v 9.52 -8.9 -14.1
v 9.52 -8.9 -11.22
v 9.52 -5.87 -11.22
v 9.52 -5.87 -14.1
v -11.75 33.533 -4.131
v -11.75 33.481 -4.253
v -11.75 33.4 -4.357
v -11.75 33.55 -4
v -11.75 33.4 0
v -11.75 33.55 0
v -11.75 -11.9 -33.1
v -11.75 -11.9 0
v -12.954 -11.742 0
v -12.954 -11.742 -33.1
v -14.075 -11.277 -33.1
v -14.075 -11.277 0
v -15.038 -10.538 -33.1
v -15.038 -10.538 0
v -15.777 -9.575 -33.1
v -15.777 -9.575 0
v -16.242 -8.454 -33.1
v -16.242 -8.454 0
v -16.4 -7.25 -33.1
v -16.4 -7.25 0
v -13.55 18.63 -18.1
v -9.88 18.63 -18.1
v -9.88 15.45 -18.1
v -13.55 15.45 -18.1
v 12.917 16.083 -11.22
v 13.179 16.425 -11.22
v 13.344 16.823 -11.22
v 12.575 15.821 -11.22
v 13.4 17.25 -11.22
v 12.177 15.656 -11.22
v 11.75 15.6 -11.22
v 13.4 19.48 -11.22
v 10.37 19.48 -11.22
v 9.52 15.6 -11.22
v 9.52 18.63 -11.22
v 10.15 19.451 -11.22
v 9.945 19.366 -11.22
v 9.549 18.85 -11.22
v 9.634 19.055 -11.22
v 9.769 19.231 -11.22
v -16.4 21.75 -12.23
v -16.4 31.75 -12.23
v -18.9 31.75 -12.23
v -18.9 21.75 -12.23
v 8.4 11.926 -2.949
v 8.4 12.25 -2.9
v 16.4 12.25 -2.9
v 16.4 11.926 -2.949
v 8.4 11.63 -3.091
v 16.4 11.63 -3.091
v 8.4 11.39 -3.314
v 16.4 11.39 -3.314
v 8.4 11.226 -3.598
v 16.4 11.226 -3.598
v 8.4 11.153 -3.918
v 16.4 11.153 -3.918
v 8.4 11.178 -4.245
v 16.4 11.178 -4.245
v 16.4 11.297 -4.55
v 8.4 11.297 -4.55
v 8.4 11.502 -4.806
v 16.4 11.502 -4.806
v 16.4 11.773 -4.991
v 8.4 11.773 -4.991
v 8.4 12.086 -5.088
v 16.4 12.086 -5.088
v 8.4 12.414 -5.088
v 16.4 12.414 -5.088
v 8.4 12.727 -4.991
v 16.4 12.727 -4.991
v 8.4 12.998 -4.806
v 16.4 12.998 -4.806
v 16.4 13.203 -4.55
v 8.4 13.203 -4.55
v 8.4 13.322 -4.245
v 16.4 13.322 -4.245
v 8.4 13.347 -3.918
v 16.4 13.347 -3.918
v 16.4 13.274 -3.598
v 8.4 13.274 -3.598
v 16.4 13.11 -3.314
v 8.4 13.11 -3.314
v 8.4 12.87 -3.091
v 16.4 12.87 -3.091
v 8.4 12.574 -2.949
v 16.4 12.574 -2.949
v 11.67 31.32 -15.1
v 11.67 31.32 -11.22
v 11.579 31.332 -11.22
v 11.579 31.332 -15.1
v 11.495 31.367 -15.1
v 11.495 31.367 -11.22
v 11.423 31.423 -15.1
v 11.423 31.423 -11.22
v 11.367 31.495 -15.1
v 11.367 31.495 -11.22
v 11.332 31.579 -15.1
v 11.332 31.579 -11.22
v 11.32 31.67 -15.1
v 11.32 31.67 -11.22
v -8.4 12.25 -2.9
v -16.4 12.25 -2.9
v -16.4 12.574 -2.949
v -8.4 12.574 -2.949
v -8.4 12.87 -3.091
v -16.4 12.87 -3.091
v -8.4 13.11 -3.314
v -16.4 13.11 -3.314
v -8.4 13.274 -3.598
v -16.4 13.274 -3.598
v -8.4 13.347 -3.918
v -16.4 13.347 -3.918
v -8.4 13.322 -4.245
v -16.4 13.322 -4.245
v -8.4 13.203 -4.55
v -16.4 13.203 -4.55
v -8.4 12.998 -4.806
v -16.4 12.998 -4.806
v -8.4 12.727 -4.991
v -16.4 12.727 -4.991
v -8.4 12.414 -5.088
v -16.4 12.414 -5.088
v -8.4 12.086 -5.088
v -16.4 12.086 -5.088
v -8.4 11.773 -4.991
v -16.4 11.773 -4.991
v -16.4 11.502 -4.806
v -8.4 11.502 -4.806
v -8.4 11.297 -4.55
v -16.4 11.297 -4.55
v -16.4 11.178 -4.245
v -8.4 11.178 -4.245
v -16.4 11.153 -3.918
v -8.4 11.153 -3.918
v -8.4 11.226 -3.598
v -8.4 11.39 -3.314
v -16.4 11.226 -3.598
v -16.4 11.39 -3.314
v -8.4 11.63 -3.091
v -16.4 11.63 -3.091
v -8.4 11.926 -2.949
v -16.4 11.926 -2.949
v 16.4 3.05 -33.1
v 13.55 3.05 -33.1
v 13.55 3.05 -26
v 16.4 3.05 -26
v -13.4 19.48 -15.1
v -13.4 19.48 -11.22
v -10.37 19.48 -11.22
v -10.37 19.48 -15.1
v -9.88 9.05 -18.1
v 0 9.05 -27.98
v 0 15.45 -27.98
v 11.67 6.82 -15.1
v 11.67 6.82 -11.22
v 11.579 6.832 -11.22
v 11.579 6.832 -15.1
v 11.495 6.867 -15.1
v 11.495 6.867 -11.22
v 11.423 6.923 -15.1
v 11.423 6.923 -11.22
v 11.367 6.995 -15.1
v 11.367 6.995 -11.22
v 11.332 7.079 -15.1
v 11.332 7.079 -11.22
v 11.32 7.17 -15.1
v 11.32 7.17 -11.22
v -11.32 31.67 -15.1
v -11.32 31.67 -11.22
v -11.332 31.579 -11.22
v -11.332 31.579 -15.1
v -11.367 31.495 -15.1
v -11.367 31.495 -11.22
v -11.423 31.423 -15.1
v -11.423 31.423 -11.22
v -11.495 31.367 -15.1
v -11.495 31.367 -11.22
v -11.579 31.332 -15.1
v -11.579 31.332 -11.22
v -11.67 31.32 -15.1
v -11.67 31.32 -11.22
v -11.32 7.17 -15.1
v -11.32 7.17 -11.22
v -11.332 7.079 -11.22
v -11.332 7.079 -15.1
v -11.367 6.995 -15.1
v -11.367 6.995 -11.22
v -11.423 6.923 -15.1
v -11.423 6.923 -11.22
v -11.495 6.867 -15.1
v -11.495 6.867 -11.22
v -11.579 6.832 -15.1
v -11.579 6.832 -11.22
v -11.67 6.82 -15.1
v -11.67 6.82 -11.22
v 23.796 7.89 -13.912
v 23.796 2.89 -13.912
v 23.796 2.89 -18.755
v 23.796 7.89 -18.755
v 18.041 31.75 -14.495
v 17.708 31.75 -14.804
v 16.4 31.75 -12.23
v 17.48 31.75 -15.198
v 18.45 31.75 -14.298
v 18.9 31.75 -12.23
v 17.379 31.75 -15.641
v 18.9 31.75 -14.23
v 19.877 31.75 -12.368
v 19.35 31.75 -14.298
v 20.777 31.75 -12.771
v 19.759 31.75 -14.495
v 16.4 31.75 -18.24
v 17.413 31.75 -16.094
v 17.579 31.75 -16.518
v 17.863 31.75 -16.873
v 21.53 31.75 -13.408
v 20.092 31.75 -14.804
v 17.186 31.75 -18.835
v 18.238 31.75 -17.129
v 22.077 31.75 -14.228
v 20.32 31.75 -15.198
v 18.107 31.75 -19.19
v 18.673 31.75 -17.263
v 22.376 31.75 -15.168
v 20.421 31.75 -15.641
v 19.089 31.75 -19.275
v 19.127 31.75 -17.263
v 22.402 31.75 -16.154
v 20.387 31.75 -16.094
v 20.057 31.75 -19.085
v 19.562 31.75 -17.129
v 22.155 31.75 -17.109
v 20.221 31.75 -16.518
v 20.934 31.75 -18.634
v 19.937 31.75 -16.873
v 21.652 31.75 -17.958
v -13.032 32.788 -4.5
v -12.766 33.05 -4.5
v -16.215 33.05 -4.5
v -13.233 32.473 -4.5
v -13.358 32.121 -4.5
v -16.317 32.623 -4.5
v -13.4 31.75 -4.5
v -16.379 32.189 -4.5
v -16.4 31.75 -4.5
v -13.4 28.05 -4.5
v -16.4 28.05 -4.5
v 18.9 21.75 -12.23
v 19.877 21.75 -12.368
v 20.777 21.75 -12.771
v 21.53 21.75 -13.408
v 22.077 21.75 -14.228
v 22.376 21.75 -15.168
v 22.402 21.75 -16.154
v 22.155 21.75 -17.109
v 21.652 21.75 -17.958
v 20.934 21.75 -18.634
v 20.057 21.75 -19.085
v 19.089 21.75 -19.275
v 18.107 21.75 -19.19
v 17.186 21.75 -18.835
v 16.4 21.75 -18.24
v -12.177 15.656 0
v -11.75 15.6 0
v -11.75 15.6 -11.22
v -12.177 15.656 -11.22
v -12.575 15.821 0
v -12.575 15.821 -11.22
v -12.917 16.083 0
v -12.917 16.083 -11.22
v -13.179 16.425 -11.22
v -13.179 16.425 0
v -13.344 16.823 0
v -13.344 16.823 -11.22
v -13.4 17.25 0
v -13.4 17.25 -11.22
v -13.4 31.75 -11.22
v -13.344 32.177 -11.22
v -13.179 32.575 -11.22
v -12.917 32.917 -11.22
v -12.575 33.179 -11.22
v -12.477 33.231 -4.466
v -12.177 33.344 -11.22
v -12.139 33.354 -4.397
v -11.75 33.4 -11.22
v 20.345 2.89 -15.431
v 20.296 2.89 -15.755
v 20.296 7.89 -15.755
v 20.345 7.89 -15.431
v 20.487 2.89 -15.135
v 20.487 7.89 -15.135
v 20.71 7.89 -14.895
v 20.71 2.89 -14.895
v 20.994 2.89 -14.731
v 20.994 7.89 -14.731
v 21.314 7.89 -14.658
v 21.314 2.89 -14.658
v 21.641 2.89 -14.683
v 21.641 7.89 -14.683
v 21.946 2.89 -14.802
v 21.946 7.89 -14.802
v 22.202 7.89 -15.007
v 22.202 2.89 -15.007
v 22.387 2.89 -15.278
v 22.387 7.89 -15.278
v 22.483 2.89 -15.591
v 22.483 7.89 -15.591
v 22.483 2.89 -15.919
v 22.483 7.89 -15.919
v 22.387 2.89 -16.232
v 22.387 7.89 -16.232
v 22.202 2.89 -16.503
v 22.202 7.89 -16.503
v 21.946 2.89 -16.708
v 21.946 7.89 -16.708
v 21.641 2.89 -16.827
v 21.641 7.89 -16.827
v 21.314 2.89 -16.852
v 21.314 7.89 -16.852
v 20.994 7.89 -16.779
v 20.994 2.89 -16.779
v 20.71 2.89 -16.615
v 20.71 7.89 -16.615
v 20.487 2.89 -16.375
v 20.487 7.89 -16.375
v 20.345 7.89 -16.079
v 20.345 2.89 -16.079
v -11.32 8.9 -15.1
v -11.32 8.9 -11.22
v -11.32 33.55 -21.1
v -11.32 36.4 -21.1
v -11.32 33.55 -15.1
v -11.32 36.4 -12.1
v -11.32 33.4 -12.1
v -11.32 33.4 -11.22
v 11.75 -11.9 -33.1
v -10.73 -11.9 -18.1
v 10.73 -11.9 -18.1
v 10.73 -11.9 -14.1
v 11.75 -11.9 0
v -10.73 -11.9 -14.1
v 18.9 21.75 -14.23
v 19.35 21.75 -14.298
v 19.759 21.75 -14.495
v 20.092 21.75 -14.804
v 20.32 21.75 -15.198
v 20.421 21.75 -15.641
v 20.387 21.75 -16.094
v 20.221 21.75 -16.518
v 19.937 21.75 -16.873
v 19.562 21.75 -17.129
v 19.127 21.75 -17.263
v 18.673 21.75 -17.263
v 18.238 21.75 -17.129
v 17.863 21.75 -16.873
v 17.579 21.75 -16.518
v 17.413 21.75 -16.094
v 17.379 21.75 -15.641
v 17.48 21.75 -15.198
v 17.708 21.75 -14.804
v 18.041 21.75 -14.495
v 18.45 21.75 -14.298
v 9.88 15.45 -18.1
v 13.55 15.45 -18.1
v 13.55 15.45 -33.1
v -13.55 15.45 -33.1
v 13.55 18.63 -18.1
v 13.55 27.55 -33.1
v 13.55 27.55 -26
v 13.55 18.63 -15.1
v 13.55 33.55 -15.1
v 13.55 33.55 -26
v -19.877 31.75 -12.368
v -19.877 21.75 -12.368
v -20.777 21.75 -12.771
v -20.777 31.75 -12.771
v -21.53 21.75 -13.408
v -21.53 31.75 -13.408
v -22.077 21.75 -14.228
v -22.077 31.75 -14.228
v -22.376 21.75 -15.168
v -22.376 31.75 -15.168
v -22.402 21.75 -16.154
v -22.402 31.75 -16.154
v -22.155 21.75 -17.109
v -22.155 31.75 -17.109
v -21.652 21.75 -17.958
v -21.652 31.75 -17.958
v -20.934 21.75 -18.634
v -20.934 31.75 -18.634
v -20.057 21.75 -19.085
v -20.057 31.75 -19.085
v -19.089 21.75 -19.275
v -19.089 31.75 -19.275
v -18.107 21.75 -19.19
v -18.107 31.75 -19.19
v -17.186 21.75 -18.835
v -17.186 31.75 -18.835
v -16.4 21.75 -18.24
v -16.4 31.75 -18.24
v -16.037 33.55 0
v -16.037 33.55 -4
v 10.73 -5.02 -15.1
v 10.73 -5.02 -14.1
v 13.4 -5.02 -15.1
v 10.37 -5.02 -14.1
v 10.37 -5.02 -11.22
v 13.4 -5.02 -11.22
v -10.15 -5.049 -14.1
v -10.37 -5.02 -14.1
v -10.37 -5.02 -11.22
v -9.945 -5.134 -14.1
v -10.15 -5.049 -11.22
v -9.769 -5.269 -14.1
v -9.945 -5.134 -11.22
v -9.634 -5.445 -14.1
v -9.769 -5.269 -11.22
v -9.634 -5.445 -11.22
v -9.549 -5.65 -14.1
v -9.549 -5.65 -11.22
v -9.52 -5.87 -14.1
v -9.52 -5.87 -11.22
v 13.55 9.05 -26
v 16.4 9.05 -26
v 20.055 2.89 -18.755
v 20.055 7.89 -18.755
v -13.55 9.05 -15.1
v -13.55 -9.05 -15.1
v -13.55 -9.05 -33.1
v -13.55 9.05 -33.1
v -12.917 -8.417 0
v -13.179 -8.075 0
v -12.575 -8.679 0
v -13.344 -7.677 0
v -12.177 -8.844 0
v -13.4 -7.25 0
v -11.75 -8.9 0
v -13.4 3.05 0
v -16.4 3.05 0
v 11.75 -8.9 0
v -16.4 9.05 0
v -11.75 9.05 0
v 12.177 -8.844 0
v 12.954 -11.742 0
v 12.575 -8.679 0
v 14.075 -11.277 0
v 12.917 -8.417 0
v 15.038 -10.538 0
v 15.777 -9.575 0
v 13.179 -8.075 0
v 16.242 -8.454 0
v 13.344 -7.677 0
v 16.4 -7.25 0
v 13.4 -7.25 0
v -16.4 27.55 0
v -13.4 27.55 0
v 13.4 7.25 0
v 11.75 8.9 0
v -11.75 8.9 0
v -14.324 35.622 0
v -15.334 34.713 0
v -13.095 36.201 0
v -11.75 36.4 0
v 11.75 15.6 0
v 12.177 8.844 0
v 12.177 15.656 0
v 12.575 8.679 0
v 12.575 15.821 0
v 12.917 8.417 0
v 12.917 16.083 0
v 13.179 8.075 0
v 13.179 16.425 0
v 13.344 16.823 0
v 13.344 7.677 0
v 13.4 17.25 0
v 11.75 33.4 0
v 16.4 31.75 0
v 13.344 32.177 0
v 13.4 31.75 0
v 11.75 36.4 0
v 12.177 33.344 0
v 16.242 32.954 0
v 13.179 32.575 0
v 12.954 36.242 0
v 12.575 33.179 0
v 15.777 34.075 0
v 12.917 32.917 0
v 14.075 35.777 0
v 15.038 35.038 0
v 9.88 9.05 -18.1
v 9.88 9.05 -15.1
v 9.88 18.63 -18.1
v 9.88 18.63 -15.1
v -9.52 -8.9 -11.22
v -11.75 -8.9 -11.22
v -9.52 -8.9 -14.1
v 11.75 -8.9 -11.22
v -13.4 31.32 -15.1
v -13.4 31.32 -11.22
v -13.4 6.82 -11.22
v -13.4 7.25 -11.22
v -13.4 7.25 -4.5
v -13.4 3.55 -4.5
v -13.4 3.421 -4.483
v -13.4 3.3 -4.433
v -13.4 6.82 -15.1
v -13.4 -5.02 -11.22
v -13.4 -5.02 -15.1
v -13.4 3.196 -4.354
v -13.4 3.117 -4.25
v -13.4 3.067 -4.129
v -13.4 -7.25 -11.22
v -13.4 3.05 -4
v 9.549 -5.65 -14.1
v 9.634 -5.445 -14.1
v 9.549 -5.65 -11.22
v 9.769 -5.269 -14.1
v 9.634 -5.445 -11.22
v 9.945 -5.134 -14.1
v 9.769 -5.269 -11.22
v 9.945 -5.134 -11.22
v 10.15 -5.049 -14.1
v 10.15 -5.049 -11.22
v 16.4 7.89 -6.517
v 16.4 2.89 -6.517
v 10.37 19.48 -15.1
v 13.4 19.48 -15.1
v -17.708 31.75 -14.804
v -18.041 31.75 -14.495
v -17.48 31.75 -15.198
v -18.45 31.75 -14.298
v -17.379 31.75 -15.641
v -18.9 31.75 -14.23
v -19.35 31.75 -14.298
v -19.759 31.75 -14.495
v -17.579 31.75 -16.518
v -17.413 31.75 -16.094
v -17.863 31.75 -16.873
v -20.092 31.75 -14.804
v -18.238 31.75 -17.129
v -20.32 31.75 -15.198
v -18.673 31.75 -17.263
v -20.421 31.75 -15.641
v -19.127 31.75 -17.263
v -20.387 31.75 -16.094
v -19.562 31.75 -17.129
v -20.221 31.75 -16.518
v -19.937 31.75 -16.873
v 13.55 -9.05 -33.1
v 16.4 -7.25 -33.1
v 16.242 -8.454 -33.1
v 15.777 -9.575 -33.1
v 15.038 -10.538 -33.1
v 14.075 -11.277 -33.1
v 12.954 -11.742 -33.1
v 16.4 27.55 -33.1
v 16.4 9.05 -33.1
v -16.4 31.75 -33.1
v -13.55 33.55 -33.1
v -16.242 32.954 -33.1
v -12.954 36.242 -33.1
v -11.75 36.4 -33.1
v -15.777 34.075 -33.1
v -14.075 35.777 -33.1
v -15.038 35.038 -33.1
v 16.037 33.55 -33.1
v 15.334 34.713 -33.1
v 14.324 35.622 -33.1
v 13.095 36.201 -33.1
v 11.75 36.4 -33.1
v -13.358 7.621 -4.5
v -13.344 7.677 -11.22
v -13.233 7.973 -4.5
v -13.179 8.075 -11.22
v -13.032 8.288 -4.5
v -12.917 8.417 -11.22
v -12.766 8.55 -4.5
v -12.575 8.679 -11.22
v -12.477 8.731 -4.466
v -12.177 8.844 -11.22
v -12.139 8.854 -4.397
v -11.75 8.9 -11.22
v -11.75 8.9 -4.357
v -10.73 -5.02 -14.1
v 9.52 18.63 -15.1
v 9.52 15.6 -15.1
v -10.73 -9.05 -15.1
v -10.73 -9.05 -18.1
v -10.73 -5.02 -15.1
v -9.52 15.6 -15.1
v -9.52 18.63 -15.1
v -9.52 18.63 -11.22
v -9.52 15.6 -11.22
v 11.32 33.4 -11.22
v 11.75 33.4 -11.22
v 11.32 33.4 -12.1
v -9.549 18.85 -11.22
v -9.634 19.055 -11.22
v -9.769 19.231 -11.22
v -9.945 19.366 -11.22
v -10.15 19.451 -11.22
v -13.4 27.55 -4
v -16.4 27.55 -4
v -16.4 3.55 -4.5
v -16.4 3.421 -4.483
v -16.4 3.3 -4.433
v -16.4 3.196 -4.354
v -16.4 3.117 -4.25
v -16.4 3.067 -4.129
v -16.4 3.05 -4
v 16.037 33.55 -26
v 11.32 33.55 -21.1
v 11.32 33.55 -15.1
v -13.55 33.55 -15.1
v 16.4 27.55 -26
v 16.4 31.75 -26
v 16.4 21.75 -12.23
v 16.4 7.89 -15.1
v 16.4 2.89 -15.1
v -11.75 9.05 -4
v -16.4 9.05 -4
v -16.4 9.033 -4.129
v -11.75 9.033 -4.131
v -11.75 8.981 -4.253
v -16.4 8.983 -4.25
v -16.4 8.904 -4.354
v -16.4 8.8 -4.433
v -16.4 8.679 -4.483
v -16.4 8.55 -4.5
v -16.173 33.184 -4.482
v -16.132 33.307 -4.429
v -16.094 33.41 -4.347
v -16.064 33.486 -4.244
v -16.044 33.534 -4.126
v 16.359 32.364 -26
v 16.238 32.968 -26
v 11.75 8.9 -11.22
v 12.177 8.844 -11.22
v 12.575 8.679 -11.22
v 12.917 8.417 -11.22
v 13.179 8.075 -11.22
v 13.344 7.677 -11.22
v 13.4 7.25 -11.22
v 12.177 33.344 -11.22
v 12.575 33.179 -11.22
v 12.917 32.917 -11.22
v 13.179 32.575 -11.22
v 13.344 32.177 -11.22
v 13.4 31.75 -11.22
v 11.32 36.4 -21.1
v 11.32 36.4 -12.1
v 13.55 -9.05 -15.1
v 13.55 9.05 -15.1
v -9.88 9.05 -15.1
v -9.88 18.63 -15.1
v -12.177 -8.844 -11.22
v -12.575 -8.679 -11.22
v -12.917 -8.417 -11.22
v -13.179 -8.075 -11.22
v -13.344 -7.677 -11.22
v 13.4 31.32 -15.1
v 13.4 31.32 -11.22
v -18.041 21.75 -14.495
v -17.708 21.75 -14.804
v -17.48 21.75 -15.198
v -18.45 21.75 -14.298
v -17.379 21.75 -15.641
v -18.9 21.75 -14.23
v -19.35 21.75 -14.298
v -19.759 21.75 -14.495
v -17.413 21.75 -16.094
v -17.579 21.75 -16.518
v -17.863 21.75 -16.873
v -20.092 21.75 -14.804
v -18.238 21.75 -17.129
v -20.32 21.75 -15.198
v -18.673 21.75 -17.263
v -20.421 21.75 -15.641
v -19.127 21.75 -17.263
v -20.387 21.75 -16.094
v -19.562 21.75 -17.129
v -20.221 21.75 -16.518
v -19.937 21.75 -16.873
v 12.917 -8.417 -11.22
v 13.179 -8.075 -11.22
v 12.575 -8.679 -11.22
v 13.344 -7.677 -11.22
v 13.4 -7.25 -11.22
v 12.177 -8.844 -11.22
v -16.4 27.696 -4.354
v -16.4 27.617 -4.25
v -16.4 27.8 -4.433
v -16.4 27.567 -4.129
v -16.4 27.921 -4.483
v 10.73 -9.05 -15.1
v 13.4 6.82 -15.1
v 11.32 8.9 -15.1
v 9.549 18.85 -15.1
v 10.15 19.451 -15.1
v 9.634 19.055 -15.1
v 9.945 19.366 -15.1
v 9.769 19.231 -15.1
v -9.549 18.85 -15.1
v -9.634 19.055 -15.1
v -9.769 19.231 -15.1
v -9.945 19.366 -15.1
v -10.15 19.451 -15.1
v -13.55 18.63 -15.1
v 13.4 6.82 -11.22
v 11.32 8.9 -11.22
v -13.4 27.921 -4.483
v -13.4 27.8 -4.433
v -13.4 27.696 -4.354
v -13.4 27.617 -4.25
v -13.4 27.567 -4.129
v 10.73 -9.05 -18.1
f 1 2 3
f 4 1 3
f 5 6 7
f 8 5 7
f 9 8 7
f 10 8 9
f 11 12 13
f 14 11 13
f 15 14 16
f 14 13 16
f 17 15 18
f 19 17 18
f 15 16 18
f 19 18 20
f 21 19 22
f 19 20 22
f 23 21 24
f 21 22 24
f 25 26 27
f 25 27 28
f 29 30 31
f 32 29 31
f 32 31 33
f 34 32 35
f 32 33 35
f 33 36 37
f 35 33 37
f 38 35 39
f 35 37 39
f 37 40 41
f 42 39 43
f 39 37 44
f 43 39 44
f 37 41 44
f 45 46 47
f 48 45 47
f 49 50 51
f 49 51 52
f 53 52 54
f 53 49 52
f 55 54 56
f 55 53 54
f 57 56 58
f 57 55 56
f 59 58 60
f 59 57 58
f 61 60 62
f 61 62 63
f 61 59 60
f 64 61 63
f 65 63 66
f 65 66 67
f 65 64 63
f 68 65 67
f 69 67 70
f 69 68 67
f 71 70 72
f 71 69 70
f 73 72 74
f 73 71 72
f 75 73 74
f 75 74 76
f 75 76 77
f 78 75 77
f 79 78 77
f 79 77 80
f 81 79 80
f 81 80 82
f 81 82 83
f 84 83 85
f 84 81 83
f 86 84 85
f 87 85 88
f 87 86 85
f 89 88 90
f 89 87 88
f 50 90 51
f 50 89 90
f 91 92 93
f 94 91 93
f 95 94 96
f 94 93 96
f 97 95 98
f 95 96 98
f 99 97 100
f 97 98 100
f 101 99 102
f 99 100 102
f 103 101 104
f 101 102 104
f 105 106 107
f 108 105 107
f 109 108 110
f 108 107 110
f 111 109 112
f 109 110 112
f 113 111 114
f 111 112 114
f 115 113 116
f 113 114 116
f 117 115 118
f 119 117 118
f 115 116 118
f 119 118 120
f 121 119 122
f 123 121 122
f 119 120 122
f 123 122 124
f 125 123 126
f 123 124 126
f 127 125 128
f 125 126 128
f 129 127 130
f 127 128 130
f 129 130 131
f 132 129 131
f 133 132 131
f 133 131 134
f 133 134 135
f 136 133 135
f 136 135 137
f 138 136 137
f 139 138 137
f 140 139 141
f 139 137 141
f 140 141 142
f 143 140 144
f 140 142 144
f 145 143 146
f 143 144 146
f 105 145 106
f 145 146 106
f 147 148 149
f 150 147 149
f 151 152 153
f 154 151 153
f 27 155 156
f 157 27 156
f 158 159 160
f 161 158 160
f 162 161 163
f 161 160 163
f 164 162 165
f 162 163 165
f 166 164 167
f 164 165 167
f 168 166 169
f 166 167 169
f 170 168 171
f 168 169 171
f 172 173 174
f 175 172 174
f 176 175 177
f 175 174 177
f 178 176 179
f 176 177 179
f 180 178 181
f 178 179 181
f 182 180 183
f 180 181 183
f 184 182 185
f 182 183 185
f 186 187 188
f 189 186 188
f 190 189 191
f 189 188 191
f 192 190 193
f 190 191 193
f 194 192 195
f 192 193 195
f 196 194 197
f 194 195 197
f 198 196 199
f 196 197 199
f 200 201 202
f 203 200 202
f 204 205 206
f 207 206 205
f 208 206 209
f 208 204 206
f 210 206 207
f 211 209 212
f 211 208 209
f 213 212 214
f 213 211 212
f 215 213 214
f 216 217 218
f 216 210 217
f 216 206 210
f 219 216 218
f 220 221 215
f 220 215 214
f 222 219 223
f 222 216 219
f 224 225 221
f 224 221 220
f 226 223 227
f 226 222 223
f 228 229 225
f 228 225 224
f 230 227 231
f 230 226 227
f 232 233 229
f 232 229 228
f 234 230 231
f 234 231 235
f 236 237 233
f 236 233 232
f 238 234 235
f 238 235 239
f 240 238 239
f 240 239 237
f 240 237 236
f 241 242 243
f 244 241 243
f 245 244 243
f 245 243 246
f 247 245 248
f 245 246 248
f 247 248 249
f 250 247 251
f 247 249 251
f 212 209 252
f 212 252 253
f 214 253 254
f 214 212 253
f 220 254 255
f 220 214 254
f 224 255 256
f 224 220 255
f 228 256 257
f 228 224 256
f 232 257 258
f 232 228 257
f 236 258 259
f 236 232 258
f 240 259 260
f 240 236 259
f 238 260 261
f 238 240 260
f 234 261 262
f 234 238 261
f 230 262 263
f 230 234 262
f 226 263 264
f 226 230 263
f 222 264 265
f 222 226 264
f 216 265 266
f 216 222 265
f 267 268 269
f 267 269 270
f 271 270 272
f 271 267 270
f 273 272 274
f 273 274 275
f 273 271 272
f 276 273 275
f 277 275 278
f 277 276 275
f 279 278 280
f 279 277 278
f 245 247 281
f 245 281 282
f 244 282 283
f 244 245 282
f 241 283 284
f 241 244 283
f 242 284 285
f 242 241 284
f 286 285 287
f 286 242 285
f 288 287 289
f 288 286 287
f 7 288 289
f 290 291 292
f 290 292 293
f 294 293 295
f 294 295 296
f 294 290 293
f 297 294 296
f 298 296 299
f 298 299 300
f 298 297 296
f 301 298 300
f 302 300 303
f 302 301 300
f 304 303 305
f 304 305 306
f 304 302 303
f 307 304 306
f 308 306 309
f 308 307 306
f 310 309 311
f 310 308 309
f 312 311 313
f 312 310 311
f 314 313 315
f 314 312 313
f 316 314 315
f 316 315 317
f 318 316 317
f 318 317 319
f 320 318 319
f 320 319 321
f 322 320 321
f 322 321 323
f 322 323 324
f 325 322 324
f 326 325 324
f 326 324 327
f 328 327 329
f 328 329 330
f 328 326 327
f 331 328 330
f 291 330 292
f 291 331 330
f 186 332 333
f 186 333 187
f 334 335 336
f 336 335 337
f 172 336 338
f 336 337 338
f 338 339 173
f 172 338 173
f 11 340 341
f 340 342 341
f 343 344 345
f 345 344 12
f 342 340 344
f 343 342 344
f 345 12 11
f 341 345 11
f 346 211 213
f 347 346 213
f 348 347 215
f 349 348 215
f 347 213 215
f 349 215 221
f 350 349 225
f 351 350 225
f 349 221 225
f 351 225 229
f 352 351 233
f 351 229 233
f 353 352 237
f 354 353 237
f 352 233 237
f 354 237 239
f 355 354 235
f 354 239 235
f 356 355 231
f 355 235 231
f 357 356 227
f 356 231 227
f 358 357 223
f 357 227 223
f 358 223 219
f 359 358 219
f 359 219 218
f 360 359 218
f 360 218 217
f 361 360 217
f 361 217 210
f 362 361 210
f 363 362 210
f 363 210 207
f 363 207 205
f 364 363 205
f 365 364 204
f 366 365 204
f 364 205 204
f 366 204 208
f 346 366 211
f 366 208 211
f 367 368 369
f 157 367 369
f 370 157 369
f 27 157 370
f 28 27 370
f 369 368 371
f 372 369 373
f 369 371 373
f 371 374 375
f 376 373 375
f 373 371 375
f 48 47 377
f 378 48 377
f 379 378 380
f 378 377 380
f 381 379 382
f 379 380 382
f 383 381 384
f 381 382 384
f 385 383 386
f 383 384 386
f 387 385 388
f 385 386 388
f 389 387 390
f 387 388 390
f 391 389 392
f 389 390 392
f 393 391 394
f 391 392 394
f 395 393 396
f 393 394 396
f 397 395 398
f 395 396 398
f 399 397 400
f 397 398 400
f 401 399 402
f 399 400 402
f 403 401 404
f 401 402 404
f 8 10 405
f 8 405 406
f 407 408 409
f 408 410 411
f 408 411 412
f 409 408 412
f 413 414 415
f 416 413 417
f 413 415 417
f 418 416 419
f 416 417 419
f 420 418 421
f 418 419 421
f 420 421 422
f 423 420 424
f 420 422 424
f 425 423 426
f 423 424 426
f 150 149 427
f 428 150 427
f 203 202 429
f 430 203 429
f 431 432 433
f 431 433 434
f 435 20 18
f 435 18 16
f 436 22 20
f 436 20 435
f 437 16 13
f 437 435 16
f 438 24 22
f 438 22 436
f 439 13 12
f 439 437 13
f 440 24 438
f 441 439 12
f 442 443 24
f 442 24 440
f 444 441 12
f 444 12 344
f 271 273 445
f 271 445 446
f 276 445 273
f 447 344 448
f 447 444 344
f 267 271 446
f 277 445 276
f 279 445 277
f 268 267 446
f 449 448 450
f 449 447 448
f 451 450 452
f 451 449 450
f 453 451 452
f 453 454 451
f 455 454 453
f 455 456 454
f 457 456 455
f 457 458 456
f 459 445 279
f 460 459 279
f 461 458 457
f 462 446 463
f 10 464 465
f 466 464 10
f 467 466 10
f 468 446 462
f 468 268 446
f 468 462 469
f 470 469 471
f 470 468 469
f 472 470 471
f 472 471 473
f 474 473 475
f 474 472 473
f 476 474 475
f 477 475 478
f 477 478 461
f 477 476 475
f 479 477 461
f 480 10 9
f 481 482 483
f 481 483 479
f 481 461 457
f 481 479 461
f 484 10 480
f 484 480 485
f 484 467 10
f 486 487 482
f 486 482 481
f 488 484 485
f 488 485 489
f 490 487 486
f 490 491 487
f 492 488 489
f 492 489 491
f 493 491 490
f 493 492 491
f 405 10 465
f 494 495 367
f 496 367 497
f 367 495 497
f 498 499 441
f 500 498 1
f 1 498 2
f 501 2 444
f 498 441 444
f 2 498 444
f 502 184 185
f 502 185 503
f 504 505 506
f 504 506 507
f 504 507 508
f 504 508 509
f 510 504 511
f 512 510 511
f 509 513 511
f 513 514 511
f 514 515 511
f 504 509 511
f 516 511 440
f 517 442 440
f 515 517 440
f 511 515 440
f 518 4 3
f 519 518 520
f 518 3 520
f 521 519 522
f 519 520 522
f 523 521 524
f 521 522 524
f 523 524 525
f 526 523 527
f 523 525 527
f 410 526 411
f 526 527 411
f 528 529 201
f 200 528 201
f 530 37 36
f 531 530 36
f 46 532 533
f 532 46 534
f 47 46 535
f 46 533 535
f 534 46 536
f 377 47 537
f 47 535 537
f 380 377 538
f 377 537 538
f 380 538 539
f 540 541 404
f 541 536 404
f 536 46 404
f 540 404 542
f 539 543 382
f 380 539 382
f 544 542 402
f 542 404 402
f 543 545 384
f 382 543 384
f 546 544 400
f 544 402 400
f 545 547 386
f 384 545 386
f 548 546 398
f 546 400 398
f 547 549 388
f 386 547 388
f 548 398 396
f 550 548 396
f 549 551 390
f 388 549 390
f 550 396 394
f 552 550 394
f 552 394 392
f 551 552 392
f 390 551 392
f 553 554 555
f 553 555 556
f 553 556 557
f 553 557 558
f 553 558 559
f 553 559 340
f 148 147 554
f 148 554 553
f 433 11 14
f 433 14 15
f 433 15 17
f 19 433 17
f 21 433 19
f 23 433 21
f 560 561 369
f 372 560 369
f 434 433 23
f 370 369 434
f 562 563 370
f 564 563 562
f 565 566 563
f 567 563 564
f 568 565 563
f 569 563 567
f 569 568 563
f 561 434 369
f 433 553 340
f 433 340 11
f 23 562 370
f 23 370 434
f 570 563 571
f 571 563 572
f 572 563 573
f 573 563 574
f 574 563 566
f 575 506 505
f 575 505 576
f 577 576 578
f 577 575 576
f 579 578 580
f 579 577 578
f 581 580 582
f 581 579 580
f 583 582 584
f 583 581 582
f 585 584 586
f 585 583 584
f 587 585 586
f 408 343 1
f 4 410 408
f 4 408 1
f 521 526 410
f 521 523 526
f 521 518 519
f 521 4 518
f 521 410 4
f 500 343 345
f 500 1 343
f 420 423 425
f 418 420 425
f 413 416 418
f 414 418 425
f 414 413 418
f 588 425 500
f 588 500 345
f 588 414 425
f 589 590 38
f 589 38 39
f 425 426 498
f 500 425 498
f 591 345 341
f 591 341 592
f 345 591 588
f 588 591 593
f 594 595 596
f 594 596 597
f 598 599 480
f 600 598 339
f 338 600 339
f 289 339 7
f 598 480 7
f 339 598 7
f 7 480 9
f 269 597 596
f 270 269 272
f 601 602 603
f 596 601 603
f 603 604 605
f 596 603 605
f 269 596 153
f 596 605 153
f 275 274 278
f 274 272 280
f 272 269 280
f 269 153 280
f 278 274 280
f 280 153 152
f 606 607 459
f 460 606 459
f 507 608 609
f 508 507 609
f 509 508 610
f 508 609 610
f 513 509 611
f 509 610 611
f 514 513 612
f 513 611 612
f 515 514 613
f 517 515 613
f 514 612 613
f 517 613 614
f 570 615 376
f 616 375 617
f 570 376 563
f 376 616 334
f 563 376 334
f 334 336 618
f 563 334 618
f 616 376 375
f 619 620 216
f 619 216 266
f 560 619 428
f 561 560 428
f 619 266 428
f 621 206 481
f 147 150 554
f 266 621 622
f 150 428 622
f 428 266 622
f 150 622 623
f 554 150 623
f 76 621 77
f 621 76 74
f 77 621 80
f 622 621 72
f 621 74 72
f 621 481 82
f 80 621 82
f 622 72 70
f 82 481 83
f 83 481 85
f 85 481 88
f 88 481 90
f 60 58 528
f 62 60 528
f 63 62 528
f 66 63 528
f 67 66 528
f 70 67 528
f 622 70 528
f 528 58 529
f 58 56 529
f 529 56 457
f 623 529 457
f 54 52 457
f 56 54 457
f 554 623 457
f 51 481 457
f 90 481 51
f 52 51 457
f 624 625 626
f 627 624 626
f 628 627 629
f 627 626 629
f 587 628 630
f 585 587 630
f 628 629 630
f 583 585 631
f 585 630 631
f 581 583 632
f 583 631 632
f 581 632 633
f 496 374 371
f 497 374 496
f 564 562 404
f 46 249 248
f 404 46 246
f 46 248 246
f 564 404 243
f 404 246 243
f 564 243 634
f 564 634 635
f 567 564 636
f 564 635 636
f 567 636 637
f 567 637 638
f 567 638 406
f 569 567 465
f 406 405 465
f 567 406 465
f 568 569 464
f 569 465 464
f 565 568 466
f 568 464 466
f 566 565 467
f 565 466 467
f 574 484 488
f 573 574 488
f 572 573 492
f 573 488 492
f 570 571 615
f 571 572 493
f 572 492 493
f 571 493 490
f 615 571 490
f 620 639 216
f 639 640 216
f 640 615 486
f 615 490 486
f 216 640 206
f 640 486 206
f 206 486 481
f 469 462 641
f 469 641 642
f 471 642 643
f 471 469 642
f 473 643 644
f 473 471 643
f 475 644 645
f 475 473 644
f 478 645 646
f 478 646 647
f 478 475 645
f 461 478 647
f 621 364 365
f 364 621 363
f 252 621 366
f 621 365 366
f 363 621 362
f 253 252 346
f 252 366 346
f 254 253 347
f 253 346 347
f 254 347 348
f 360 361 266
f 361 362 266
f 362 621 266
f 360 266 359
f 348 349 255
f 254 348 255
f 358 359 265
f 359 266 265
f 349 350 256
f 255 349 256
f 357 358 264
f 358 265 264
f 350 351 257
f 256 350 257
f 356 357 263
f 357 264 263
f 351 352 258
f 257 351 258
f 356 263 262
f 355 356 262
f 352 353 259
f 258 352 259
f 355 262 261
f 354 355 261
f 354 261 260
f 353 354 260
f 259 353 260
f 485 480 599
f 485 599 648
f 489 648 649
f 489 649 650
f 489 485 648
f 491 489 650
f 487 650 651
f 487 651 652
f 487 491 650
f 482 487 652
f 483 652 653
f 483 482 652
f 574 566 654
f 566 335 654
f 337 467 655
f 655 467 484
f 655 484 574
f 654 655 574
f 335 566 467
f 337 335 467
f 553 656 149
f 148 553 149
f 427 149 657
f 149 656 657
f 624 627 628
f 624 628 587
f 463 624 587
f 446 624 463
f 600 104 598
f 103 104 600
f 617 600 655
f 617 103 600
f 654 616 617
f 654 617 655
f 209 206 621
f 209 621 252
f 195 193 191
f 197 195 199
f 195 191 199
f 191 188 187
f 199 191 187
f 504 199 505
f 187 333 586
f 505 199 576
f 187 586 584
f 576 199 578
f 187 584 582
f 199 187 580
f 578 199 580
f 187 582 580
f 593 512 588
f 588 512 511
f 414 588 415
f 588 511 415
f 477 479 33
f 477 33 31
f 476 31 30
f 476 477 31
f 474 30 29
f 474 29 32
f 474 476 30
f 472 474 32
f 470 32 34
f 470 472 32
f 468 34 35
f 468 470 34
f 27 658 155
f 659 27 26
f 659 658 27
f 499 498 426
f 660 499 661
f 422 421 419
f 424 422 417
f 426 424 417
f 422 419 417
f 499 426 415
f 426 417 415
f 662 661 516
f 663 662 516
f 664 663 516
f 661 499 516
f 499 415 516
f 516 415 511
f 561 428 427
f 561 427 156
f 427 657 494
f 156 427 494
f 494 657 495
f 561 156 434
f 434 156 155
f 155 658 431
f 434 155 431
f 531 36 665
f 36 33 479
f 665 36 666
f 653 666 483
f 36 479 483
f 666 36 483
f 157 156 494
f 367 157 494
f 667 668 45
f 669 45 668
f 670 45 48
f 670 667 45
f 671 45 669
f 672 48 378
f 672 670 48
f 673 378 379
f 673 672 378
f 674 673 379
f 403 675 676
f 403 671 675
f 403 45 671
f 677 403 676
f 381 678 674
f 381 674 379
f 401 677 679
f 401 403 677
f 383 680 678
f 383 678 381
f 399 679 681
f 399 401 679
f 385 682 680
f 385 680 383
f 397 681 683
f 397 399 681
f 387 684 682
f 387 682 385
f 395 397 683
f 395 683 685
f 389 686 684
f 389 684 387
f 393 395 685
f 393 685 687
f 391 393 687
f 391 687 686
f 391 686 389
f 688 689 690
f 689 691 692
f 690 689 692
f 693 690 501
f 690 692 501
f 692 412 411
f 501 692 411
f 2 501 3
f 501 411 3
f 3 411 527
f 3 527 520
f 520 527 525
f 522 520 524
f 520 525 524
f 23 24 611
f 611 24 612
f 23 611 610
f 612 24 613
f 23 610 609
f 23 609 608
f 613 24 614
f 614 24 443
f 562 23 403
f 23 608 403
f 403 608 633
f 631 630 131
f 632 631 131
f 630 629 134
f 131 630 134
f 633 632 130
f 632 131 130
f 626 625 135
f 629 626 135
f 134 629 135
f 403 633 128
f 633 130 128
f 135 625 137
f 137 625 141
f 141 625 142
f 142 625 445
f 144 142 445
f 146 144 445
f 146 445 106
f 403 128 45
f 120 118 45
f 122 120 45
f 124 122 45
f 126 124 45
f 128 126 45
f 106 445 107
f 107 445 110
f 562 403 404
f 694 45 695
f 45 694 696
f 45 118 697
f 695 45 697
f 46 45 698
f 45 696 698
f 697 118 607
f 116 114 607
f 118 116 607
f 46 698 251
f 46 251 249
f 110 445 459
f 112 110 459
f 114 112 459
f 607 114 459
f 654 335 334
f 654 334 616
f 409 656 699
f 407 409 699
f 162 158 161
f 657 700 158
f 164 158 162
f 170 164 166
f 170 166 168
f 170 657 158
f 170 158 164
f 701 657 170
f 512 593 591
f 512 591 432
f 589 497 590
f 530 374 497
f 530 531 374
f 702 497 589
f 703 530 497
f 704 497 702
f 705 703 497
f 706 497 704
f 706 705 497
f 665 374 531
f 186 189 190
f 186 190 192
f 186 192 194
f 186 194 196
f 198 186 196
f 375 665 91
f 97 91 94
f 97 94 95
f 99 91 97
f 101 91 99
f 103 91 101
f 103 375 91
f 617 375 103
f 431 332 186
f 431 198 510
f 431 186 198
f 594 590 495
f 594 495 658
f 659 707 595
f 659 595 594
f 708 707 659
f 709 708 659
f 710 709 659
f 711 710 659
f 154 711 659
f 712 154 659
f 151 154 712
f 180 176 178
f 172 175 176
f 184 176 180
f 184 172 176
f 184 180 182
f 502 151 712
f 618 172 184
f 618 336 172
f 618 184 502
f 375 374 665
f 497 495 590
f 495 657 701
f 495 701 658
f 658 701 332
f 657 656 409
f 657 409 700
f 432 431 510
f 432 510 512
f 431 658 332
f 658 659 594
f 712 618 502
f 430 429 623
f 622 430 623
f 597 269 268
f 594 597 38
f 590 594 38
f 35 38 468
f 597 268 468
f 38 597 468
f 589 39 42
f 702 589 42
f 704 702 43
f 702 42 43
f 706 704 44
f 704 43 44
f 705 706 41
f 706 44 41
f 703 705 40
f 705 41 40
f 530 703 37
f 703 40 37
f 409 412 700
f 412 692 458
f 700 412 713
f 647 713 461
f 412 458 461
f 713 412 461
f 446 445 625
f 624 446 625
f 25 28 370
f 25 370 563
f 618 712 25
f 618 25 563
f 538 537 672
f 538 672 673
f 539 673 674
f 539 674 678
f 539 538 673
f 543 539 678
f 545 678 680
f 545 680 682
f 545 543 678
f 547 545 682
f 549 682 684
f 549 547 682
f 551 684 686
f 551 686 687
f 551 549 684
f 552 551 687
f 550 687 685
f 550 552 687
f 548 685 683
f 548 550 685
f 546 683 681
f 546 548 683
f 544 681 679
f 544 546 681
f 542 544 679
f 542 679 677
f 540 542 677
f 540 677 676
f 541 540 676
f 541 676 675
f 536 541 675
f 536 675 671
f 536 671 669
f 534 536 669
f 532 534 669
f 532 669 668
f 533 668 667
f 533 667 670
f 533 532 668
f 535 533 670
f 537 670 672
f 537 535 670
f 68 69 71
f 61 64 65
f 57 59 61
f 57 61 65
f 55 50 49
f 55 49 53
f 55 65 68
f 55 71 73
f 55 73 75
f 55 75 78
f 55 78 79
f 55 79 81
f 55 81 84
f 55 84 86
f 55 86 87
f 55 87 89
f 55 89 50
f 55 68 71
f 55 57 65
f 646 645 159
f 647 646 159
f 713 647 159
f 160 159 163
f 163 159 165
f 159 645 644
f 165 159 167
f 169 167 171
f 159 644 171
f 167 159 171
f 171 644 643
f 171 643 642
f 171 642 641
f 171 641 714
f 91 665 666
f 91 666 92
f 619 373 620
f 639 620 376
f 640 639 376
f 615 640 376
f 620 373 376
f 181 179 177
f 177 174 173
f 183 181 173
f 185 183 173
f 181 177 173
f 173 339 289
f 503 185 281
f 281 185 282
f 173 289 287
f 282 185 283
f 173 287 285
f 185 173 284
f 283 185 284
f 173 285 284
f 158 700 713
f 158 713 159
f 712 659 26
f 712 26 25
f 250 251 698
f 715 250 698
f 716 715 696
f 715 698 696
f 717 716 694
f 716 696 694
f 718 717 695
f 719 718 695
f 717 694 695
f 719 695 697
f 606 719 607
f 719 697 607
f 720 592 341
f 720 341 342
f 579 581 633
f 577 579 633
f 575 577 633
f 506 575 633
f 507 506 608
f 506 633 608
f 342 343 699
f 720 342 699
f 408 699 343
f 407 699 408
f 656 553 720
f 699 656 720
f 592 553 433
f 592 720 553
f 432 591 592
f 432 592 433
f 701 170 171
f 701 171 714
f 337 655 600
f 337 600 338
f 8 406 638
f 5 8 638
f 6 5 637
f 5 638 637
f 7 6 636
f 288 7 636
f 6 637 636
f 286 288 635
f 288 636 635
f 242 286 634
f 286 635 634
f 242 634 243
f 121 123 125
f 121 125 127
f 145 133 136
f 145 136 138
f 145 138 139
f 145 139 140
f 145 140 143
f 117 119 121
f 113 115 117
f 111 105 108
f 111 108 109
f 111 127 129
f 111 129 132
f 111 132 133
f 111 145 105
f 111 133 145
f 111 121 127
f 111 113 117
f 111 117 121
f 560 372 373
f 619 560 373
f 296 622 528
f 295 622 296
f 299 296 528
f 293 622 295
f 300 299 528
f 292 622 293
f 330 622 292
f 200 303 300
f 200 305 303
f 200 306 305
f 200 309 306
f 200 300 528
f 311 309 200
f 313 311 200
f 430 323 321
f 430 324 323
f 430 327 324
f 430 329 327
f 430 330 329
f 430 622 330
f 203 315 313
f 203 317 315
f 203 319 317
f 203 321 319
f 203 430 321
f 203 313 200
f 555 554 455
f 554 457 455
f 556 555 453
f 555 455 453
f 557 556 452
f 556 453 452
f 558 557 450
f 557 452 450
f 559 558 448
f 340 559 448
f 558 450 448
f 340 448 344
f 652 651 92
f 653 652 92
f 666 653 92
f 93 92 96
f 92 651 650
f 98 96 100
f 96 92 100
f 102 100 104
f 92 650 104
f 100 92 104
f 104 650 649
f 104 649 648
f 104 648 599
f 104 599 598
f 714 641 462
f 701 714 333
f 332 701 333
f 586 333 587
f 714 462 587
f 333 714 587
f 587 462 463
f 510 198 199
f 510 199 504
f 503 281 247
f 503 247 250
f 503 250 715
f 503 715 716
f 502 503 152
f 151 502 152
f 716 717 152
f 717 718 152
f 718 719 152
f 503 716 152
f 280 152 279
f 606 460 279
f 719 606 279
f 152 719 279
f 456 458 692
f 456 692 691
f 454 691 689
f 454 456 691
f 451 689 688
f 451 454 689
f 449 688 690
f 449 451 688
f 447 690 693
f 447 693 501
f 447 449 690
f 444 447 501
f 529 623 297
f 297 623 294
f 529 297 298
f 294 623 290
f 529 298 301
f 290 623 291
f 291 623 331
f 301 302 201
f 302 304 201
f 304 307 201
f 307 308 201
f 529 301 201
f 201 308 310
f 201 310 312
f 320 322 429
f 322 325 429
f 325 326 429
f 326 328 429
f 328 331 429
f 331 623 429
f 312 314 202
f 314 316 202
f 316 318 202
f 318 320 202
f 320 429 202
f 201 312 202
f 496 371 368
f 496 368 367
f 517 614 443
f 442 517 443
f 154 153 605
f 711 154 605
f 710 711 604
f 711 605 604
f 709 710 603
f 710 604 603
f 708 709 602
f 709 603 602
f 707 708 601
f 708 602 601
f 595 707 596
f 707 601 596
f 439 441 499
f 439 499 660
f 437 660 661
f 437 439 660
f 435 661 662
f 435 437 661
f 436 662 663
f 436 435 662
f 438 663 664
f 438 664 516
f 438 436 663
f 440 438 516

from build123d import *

# Parameters (mm, degrees)
EXTRUDE_2_DEPTH      = 11.22
EXTRUDE_3_DEPTH      = 3.88
CUT_EXTRUDE_1_DEPTH  = 4.65
SKETCH_8_R           = 3.525
SKETCH_8_R_2         = 1.525
EXTRUDE_5_DEPTH      = 10
SKETCH_9_W           = 22.64
SKETCH_9_H           = 3
CUT_EXTRUDE_3_DEPTH  = 3
SKETCH_10_W          = 21.46
SKETCH_10_H          = 6.88
CUT_EXTRUDE_4_DEPTH  = 1
SKETCH_11_R          = 1.1
EXTRUDE_6_DEPTH      = 5
SKETCH_12_R          = 1.1
CUT_EXTRUDE_5_DEPTH  = 8
CUT_EXTRUDE_START    = -8
SKETCH_13_R          = 1.1
CUT_EXTRUDE_6_DEPTH  = 8
SKETCH_14_W          = 6.52
SKETCH_14_H          = 9.58
EXTRUDE_7_DEPTH      = 3
SKETCH_15_W          = 27.1
SKETCH_15_H          = 42.6
EXTRUDE_8_DEPTH      = 18
SKETCH_16_W          = 27.1
SKETCH_16_H          = 6.4
EXTRUDE_9_DEPTH      = 15
CUT_EXTRUDE_8_REACH  = 51.09
CUT_EXTRUDE_9_REACH  = 62.949
SKETCH_18_W          = 7.1
SKETCH_18_H          = 6
CUT_EXTRUDE_START_2  = -2.85
SKETCH_19_W          = 21.46
SKETCH_19_H          = 1
SKETCH_19_H_2        = 3
CUT_EXTRUDE_10_DEPTH = 2.85
CUT_EXTRUDE_11_REACH = 65.204
SKETCH_20_W          = 22.64
SKETCH_20_H          = 6


with BuildPart() as part:
    # 草图2 → 凸台-拉伸2 (new body)
    with BuildSketch(Plane.XY):
        with BuildLine():
            ThreePointArc((-16.4, -7.25), (-15.038046533, -10.538046533), (-11.75, -11.9))
            Line((-11.75, -11.9), (11.75, -11.9))
            ThreePointArc((11.75, -11.9), (15.038046533, -10.538046533), (16.4, -7.25))
            Line((16.4, -7.25), (16.4, 31.75))
            ThreePointArc((16.4, 31.75), (15.038046533, 35.038046533), (11.75, 36.4))
            Line((11.75, 36.4), (-11.75, 36.4))
            ThreePointArc((-11.75, 36.4), (-15.038046533, 35.038046533), (-16.4, 31.75))
            Line((-16.4, 31.75), (-16.4, -7.25))
        make_face()
        with BuildLine():
            Line((13.4, 7.25), (13.4, -7.25))
            ThreePointArc((13.4, -7.25), (12.916726189, -8.416726189), (11.75, -8.9))
            Line((11.75, -8.9), (-11.75, -8.9))
            ThreePointArc((-11.75, -8.9), (-12.916726189, -8.416726189), (-13.4, -7.25))
            Line((-13.4, -7.25), (-13.4, 7.25))
            ThreePointArc((-13.4, 7.25), (-12.916726189, 8.416726189), (-11.75, 8.9))
            Line((-11.75, 8.9), (11.75, 8.9))
            ThreePointArc((11.75, 8.9), (12.916726189, 8.416726189), (13.4, 7.25))
        make_face(mode=Mode.SUBTRACT)
        with BuildLine():
            Line((-11.75, 33.4), (11.75, 33.4))
            ThreePointArc((11.75, 33.4), (12.916726189, 32.916726189), (13.4, 31.75))
            Line((13.4, 31.75), (13.4, 17.25))
            ThreePointArc((13.4, 17.25), (12.916726189, 16.083273811), (11.75, 15.6))
            Line((11.75, 15.6), (-11.75, 15.6))
            ThreePointArc((-11.75, 15.6), (-12.916726189, 16.083273811), (-13.4, 17.25))
            Line((-13.4, 17.25), (-13.4, 31.75))
            ThreePointArc((-13.4, 31.75), (-12.916726189, 32.916726189), (-11.75, 33.4))
        make_face(mode=Mode.SUBTRACT)
    extrude(amount=-EXTRUDE_2_DEPTH)

    # 草图3 → 凸台-拉伸3 (add)
    with BuildSketch(Plane(origin=(0, 0, -11.22), x_dir=(-1, 0, 0), z_dir=(0, 0, -1))):
        with BuildLine():
            ThreePointArc((11.75, -11.9), (15.038046533, -10.538046533), (16.4, -7.25))
            Line((16.4, -7.25), (16.4, 31.75))
            ThreePointArc((16.4, 31.75), (15.038046533, 35.038046533), (11.75, 36.4))
            Line((11.75, 36.4), (-11.75, 36.4))
            ThreePointArc((-11.75, 36.4), (-15.038046533, 35.038046533), (-16.4, 31.75))
            Line((-16.4, 31.75), (-16.4, -7.25))
            ThreePointArc((-16.4, -7.25), (-15.038046533, -10.538046533), (-11.75, -11.9))
            Line((-11.75, -11.9), (11.75, -11.9))
        make_face()
        with BuildLine():
            Line((13.4, -5.02), (10.37, -5.02))
            ThreePointArc((10.37, -5.02), (9.768959236, -5.268959236), (9.52, -5.87))
            Line((9.52, -5.87), (9.52, -8.9))
            Line((9.52, -8.9), (-9.52, -8.9))
            Line((-9.52, -8.9), (-9.52, -5.87))
            ThreePointArc((-9.52, -5.87), (-9.768959236, -5.268959236), (-10.37, -5.02))
            Line((-10.37, -5.02), (-13.4, -5.02))
            Line((-13.4, -5.02), (-13.4, 6.82))
            Line((-13.4, 6.82), (-11.67, 6.82))
            ThreePointArc((-11.67, 6.82), (-11.422512627, 6.922512627), (-11.32, 7.17))
            Line((-11.32, 7.17), (-11.32, 8.9))
            Line((-11.32, 8.9), (11.32, 8.9))
            Line((11.32, 8.9), (11.32, 7.17))
            ThreePointArc((11.32, 7.17), (11.422512627, 6.922512627), (11.67, 6.82))
            Line((11.67, 6.82), (13.4, 6.82))
            Line((13.4, 6.82), (13.4, -5.02))
        make_face(mode=Mode.SUBTRACT)
        with BuildLine():
            Line((13.4, 31.32), (13.4, 19.48))
            Line((13.4, 19.48), (10.37, 19.48))
            ThreePointArc((10.37, 19.48), (9.768959236, 19.231040764), (9.52, 18.63))
            Line((9.52, 18.63), (9.52, 15.6))
            Line((9.52, 15.6), (-9.52, 15.6))
            Line((-9.52, 15.6), (-9.52, 18.63))
            ThreePointArc((-9.52, 18.63), (-9.768959236, 19.231040764), (-10.37, 19.48))
            Line((-10.37, 19.48), (-13.4, 19.48))
            Line((-13.4, 19.48), (-13.4, 31.32))
            Line((-13.4, 31.32), (-11.67, 31.32))
            ThreePointArc((-11.67, 31.32), (-11.422512627, 31.422512627), (-11.32, 31.67))
            Line((-11.32, 31.67), (-11.32, 33.4))
            Line((-11.32, 33.4), (11.32, 33.4))
            Line((11.32, 33.4), (11.32, 31.67))
            ThreePointArc((11.32, 31.67), (11.422512627, 31.422512627), (11.67, 31.32))
            Line((11.67, 31.32), (13.4, 31.32))
        make_face(mode=Mode.SUBTRACT)
    extrude(amount=EXTRUDE_3_DEPTH)

    # 草图4 → 切除-拉伸1 (cut)
    with BuildSketch(Plane.ZY.offset(16.4)):
        with BuildLine():
            Line((0.3, 9.05), (-4, 9.05))
            ThreePointArc((-4, 9.05), (-4.353553391, 8.903553391), (-4.5, 8.55))
            Line((-4.5, 8.55), (-4.5, 3.55))
            ThreePointArc((-4.5, 3.55), (-4.353553391, 3.196446609), (-4, 3.05))
            Line((-4, 3.05), (0.3, 3.05))
            Line((0.3, 3.05), (0.3, 9.05))
        make_face()
        with BuildLine():
            Line((0.3, 33.55), (-4, 33.55))
            ThreePointArc((-4, 33.55), (-4.353553391, 33.403553391), (-4.5, 33.05))
            Line((-4.5, 33.05), (-4.5, 28.05))
            ThreePointArc((-4.5, 28.05), (-4.353553391, 27.696446609), (-4, 27.55))
            Line((-4, 27.55), (0.3, 27.55))
            Line((0.3, 27.55), (0.3, 33.55))
        make_face()
    extrude(amount=-CUT_EXTRUDE_1_DEPTH, mode=Mode.SUBTRACT)

    # 草图8 → 凸台-拉伸5 (add)
    # profile 1 of 2: a face of its own
    with BuildSketch(Plane(origin=(0, 31.75, 0), x_dir=(1, 0, 0), z_dir=(0, 1, 0))):
        with Locations((18.9, 15.755)):
            Circle(SKETCH_8_R)
        with Locations(Location((18.9, 15.755, 0), (0, 0, 270))):
            Circle(SKETCH_8_R_2, mode=Mode.SUBTRACT)
    # profile 2 of 2: a face of its own
    with BuildSketch(Plane(origin=(0, 31.75, 0), x_dir=(1, 0, 0), z_dir=(0, 1, 0))):
        with BuildLine():
            Line((15.375, 12.23), (18.9, 12.23))
            ThreePointArc((18.9, 12.23), (16.407448596, 13.262448596), (15.375, 15.755))
            Line((15.375, 15.755), (15.375, 12.23))
        make_face()
    extrude_5 = extrude(amount=-EXTRUDE_5_DEPTH)

    # 镜向1: 凸台-拉伸5 across plane
    add(extrude_5.mirror(Plane(origin=(0, 0, 0), x_dir=(0, 0, 1), z_dir=(1, 0, 0))))

    # 草图9 → 切除-拉伸3 (cut)
    with BuildSketch(Plane(origin=(0, 0, -15.1), x_dir=(-1, 0, 0), z_dir=(0, 0, -1))):
        with Locations((0, 34.9)):
            Rectangle(SKETCH_9_W, SKETCH_9_H)
    extrude(amount=-CUT_EXTRUDE_3_DEPTH, mode=Mode.SUBTRACT)

    # 草图10 → 切除-拉伸4 (cut)
    with BuildSketch(Plane(origin=(0, 0, -15.1), x_dir=(-1, 0, 0), z_dir=(0, 0, -1))):
        with Locations((0, -8.46)):
            Rectangle(SKETCH_10_W, SKETCH_10_H)
    extrude(amount=-CUT_EXTRUDE_4_DEPTH, mode=Mode.SUBTRACT)

    # 草图11 → 凸台-拉伸6 (add)
    with BuildSketch(Plane(origin=(0, 2.890336251, 0), x_dir=(1, 0, 0), z_dir=(0, 1, 0))):
        Polygon((23.795757056, 13.912359313), (23.795757056, 18.755), (20.055, 18.755), (16.4, 15.1), (16.4, 6.516602257), align=None)
        with Locations(Location((21.395757056, 15.755, 0), (0, 0, 180))):
            Circle(SKETCH_11_R, mode=Mode.SUBTRACT)
    extrude(amount=EXTRUDE_6_DEPTH)

    # 草图12 → 切除-拉伸5 (cut)
    with BuildSketch(Plane.ZY.offset(16.4)):
        with Locations((-4, 12.25)):
            Circle(SKETCH_12_R)
    extrude(amount=-CUT_EXTRUDE_5_DEPTH, mode=Mode.SUBTRACT)

    # 草图13 → 切除-拉伸6 (cut)
    with BuildSketch(Plane(origin=(16.4, 0, 0), x_dir=(0, 0, -1), z_dir=(1, 0, 0)).offset(CUT_EXTRUDE_START)):
        with Locations(Location((4, 12.25, 0), (0, 0, 180))):
            Circle(SKETCH_13_R)
    extrude(amount=CUT_EXTRUDE_6_DEPTH, mode=Mode.SUBTRACT)

    # 草图14 → 凸台-拉伸7 (add)
    with BuildSketch(Plane(origin=(0, 0, -15.1), x_dir=(-1, 0, 0), z_dir=(0, 0, -1))):
        with Locations((-13.14, 13.84)):
            Rectangle(SKETCH_14_W, SKETCH_14_H)
        with Locations((13.14, 13.84)):
            Rectangle(SKETCH_14_W, SKETCH_14_H)
    extrude(amount=EXTRUDE_7_DEPTH)

    # 草图15 → 凸台-拉伸8 (add)
    with BuildSketch(Plane(origin=(0, 0, -15.1), x_dir=(-1, 0, 0), z_dir=(0, 0, -1))):
        with BuildLine():
            Line((16.4, 9.05), (16.4, 18.63))
            Line((16.4, 18.63), (16.4, 31.75))
            ThreePointArc((16.4, 31.75), (15.038046533, 35.038046533), (11.75, 36.4))
            Line((11.75, 36.4), (-11.75, 36.4))
            ThreePointArc((-11.75, 36.4), (-15.038046533, 35.038046533), (-16.4, 31.75))
            Line((-16.4, 31.75), (-16.4, 21.75))
            Line((-16.4, 21.75), (-16.4, 18.63))
            Line((-16.4, 18.63), (-16.4, 9.05))
            Line((-16.4, 9.05), (-16.4, 2.890336251))
            Line((-16.4, 2.890336251), (-16.4, -7.25))
            ThreePointArc((-16.4, -7.25), (-15.038046533, -10.538046533), (-11.75, -11.9))
            Line((-11.75, -11.9), (11.75, -11.9))
            ThreePointArc((11.75, -11.9), (15.038046533, -10.538046533), (16.4, -7.25))
            Line((16.4, -7.25), (16.4, 9.05))
        make_face()
        with Locations((0, 12.25)):
            Rectangle(SKETCH_15_W, SKETCH_15_H, mode=Mode.SUBTRACT)
    extrude(amount=EXTRUDE_8_DEPTH)

    # 草图16 → 凸台-拉伸9 (add)
    with BuildSketch(Plane(origin=(0, 0, -18.1), x_dir=(-1, 0, 0), z_dir=(0, 0, -1))):
        with Locations((0, 12.25)):
            Rectangle(SKETCH_16_W, SKETCH_16_H)
    extrude(amount=EXTRUDE_9_DEPTH)

    # 草图17 → 切除-拉伸8 (cut, up to next)
    with BuildSketch(Plane.XZ.offset(-9.05), mode=Mode.PRIVATE) as cut_extrude_8_sk1:
        Polygon((-9.88, -18.1), (0, -27.98), (9.88, -18.1), align=None)
    cut_extrude_8_tool1 = extrude(cut_extrude_8_sk1.sketch, amount=-CUT_EXTRUDE_8_REACH, mode=Mode.PRIVATE) & part.part
    add(cut_extrude_8_tool1.solids().sort_by_distance((0, 9.05, -21.393333))[0], mode=Mode.SUBTRACT)

    # 草图18 → 切除-拉伸9 (cut, up to next)
    with BuildSketch(Plane.ZY.offset(-13.55), mode=Mode.PRIVATE) as cut_extrude_9_sk1:
        with Locations((-29.55, 6.05)):
            Rectangle(SKETCH_18_W, SKETCH_18_H)
    cut_extrude_9_tool1 = extrude(cut_extrude_9_sk1.sketch, amount=-CUT_EXTRUDE_9_REACH, mode=Mode.PRIVATE) & part.part
    # 草图18 → 切除-拉伸9 (cut, up to next)
    with BuildSketch(Plane.ZY.offset(-13.55), mode=Mode.PRIVATE) as cut_extrude_9_sk2:
        with Locations((-29.55, 30.55)):
            Rectangle(SKETCH_18_W, SKETCH_18_H)
    cut_extrude_9_tool2 = extrude(cut_extrude_9_sk2.sketch, amount=-CUT_EXTRUDE_9_REACH, mode=Mode.PRIVATE) & part.part
    add(cut_extrude_9_tool1.solids().sort_by_distance((13.55, 6.05, -29.55))[0], mode=Mode.SUBTRACT)
    add(cut_extrude_9_tool2.solids().sort_by_distance((13.55, 30.55, -29.55))[0], mode=Mode.SUBTRACT)

    # 草图19 → 切除-拉伸10 (cut)
    with BuildSketch(Plane.XZ.offset(11.9).offset(CUT_EXTRUDE_START_2)):
        with Locations((0, -14.6)):
            Rectangle(SKETCH_19_W, SKETCH_19_H)
        with Locations((0, -16.6)):
            Rectangle(SKETCH_19_W, SKETCH_19_H_2)
    extrude(amount=CUT_EXTRUDE_10_DEPTH, mode=Mode.SUBTRACT)

    # 草图20 → 切除-拉伸11 (cut, up to next)
    with BuildSketch(Plane(origin=(0, 36.4, 0), x_dir=(1, 0, 0), z_dir=(0, 1, 0)), mode=Mode.PRIVATE) as cut_extrude_11_sk1:
        with Locations((0, 18.1)):
            Rectangle(SKETCH_20_W, SKETCH_20_H)
    cut_extrude_11_tool1 = extrude(cut_extrude_11_sk1.sketch, amount=-CUT_EXTRUDE_11_REACH, mode=Mode.PRIVATE) & part.part
    add(cut_extrude_11_tool1.solids().sort_by_distance((0, 36.4, -18.1))[0], mode=Mode.SUBTRACT)


solid = part.part
